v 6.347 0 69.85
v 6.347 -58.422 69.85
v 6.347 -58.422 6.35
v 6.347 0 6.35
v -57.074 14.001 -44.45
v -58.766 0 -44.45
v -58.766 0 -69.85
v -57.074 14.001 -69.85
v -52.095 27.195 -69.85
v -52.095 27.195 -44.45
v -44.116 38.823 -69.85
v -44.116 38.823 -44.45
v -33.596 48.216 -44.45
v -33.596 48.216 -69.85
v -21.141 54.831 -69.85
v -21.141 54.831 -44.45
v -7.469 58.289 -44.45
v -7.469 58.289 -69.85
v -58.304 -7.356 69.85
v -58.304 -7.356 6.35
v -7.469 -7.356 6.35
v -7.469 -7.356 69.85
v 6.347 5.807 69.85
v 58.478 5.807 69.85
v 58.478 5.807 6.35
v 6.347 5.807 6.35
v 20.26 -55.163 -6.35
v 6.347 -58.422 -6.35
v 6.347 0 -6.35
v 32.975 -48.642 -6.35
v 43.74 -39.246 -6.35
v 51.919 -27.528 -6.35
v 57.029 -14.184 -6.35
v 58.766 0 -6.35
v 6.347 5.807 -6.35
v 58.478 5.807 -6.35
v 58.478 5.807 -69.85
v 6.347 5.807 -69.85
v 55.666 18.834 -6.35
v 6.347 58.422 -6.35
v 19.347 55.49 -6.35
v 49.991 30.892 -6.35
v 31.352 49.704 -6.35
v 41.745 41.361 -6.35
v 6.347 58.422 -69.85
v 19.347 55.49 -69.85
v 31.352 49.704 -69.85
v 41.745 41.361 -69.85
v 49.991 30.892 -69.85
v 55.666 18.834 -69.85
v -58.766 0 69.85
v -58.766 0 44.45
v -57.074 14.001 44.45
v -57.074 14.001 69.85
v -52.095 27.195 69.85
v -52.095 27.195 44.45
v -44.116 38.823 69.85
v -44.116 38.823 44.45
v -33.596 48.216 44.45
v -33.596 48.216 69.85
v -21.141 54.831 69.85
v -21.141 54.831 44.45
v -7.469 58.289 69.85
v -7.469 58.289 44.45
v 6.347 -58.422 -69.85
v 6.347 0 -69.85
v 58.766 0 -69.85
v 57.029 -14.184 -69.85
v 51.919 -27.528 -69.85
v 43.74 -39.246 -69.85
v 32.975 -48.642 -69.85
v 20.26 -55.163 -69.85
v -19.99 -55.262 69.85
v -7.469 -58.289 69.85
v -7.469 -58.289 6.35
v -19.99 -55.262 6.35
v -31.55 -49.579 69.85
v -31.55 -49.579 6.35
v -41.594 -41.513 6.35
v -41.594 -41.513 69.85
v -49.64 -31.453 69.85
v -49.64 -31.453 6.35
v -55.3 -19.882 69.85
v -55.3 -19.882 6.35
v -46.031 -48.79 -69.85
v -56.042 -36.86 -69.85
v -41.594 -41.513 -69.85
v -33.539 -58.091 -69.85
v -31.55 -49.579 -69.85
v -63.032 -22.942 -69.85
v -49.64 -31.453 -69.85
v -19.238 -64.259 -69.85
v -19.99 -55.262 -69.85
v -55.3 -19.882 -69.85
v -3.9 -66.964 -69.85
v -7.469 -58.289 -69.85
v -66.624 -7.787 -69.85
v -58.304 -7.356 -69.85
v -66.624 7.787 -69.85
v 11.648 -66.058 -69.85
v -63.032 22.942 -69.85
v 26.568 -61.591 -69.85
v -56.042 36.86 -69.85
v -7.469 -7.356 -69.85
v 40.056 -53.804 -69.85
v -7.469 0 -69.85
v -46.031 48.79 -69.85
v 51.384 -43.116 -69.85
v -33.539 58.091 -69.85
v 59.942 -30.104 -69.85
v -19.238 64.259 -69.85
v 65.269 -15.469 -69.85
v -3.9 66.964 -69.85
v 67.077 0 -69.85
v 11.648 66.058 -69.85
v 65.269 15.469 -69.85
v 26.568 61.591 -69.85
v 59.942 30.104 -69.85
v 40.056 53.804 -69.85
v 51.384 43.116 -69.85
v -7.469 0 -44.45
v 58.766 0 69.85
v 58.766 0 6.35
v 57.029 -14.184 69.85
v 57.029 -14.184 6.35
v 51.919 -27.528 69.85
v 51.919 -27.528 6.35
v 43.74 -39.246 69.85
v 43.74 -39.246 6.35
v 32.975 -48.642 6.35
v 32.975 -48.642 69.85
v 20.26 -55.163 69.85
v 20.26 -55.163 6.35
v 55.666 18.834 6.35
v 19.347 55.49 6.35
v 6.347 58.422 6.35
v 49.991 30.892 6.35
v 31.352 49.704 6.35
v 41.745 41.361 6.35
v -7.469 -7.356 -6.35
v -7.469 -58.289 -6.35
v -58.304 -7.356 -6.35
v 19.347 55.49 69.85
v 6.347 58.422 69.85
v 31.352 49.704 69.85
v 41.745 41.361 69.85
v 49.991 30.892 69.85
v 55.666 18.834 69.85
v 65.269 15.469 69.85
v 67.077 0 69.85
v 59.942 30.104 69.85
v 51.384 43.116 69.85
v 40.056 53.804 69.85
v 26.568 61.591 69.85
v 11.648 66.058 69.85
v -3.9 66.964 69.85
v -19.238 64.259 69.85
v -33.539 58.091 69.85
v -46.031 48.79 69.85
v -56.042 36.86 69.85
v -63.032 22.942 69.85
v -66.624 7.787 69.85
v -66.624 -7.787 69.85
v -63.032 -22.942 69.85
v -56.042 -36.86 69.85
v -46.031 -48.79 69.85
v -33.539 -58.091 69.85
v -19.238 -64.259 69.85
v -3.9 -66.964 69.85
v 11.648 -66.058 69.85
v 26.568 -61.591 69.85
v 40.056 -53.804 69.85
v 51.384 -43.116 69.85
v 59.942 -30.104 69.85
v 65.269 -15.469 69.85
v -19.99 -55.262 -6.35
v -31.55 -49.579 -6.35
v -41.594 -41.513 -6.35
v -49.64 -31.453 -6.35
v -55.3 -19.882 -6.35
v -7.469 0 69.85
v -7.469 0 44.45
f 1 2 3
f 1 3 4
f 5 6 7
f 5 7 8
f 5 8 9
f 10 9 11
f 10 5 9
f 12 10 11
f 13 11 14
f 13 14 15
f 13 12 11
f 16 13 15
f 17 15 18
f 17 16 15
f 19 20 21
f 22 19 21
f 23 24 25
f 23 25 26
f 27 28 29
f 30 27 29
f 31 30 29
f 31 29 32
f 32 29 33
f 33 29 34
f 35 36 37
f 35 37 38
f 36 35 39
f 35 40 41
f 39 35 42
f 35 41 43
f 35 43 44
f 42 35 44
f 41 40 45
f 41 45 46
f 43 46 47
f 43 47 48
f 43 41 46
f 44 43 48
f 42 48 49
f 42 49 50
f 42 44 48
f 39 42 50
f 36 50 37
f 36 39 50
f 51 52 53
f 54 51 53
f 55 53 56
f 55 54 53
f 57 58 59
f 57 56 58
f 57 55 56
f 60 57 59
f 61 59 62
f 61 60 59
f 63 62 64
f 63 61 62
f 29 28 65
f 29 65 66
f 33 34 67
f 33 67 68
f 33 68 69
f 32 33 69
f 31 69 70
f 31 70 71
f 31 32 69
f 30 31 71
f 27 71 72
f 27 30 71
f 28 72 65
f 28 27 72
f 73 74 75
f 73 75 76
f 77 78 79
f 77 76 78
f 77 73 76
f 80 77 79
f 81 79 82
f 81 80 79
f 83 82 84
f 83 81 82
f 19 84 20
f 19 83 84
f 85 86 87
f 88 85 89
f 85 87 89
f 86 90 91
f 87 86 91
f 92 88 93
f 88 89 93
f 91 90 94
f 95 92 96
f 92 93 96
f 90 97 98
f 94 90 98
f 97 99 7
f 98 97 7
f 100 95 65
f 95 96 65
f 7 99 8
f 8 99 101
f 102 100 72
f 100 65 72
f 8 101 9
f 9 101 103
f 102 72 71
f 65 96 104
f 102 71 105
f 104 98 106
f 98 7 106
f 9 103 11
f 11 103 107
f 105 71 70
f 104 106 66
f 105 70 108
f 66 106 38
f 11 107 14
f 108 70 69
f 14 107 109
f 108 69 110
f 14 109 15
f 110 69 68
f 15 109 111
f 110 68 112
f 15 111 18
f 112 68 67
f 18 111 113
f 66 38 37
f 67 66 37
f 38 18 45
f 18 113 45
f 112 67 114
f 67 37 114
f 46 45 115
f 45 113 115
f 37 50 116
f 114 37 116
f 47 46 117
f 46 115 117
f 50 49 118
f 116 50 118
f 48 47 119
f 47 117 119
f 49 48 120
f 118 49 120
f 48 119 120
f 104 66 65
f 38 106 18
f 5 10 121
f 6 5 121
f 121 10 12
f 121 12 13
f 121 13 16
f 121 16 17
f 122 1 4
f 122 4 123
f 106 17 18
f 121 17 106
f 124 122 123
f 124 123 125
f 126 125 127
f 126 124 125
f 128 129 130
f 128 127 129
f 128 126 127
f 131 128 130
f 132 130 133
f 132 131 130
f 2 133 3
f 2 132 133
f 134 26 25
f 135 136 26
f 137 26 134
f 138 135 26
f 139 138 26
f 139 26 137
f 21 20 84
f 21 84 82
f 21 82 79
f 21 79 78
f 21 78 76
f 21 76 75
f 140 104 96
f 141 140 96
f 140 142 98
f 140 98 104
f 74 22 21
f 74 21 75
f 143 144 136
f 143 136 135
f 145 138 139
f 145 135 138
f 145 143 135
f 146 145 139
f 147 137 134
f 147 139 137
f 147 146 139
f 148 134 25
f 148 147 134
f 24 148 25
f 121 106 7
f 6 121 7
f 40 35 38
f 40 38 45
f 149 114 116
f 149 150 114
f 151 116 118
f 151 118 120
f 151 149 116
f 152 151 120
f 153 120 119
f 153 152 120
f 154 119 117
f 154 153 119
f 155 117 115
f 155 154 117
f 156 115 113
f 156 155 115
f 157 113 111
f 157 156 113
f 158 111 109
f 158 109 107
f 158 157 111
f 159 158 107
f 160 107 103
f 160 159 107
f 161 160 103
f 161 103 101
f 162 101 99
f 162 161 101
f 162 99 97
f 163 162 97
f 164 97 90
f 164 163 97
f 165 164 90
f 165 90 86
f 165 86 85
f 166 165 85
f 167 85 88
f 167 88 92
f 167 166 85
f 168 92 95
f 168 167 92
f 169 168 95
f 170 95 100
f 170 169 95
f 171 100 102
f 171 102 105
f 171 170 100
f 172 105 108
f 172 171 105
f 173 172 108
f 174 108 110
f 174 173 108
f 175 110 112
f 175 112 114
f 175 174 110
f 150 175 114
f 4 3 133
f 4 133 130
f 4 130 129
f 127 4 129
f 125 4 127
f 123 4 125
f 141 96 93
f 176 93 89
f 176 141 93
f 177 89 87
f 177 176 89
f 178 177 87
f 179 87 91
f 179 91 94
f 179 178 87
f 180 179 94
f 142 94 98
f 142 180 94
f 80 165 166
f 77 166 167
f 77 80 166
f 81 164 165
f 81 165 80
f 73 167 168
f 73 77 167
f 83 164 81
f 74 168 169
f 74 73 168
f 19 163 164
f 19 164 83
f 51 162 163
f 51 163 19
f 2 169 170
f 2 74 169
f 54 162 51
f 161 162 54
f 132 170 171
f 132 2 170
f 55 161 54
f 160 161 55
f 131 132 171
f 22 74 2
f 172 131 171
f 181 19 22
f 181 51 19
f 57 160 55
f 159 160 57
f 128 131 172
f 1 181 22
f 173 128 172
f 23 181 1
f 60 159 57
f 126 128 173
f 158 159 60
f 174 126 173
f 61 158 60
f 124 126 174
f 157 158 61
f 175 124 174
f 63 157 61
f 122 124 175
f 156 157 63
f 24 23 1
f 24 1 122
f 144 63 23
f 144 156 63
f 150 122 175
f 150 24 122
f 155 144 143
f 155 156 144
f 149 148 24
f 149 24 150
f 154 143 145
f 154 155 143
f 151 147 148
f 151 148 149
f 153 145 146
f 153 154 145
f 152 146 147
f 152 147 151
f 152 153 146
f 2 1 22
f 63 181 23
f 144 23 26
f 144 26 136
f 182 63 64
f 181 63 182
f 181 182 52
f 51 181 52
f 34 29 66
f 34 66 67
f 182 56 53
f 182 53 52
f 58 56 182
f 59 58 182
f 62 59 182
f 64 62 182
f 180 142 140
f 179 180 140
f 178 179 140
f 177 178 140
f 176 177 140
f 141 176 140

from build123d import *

# Parameters (mm, degrees)
F0_R     = 67.0773206954
F1_DEPTH = 69.85
F2_DEPTH = 6.35
F3_DEPTH = 44.45


# Not quite as in the source:
# - a feature names something its author has since deleted; it is built from what else it names


with BuildPart() as f1:
    # F0 (on Top) → F1 (new body, symmetric)
    with BuildSketch(Plane.XY):
        Circle(F0_R)
        with BuildLine():
            ThreePointArc((58.4782874441, 5.8071771637), (58.6939681668, 2.9071480599), (58.7659204727, 0))
            ThreePointArc((58.7659204727, 0), (43.7402884604, -39.2456440183), (6.3470844528, -58.4221527159))
            ThreePointArc((6.3470844528, -58.4221527159), (-0.5649559649, -58.7632047608), (-7.469161507, -58.2893217956))
            ThreePointArc((-7.469161507, -58.2893217956), (-41.5941780551, -41.5133443718), (-58.3037411026, -7.3557584547))
            ThreePointArc((-58.3037411026, -7.3557584547), (-58.6502618149, -3.6851320266), (-58.7659204727, 0))
            ThreePointArc((-58.7659204727, 0), (-44.1155616542, 38.8233258357), (-7.469161507, 58.2893217956))
            ThreePointArc((-7.469161507, 58.2893217956), (-0.5649559649, 58.7632047608), (6.3470844528, 58.4221527159))
            ThreePointArc((6.3470844528, 58.4221527159), (41.745252706, 41.3614226729), (58.4782874441, 5.8071771637))
        make_face(mode=Mode.SUBTRACT)
        with BuildLine():
            ThreePointArc((-7.469161507, -58.2893217956), (-0.5649559649, -58.7632047608), (6.3470844528, -58.4221527159))
            Line((6.3470844528, -58.4221527159), (6.3470844528, 0))
            Line((6.3470844528, 0), (6.3470844528, 5.8071771637))
            Line((6.3470844528, 5.8071771637), (6.3470844528, 58.4221527159))
            ThreePointArc((6.3470844528, 58.4221527159), (-0.5649559649, 58.7632047608), (-7.469161507, 58.2893217956))
            Line((-7.469161507, 58.2893217956), (-7.469161507, 0))
            Line((-7.469161507, 0), (-7.469161507, -7.3557584547))
            Line((-7.469161507, -7.3557584547), (-7.469161507, -58.2893217956))
        make_face()
        with BuildLine():
            Line((6.3470844528, 0), (58.7659204727, 0))
            ThreePointArc((58.7659204727, 0), (58.6939681668, 2.9071480599), (58.4782874441, 5.8071771637))
            Line((58.4782874441, 5.8071771637), (6.3470844528, 5.8071771637))
            Line((6.3470844528, 5.8071771637), (6.3470844528, 0))
        make_face()
        with BuildLine():
            ThreePointArc((-58.7659204727, 0), (-58.6502618149, -3.6851320266), (-58.3037411026, -7.3557584547))
            Line((-58.3037411026, -7.3557584547), (-7.469161507, -7.3557584547))
            Line((-7.469161507, -7.3557584547), (-7.469161507, 0))
            Line((-7.469161507, 0), (-58.7659204727, 0))
        make_face()
    extrude(amount=F1_DEPTH, both=True)

    # F0 (on Top) → F2 (join, symmetric)
    with BuildSketch(Plane.XY):
        with BuildLine():
            ThreePointArc((-58.7659204727, 0), (-58.6502618149, -3.6851320266), (-58.3037411026, -7.3557584547))
            Line((-58.3037411026, -7.3557584547), (-7.469161507, -7.3557584547))
            Line((-7.469161507, -7.3557584547), (-7.469161507, 0))
            Line((-7.469161507, 0), (-58.7659204727, 0))
        make_face()
        with BuildLine():
            Line((6.3470844528, 5.8071771637), (58.4782874441, 5.8071771637))
            ThreePointArc((58.4782874441, 5.8071771637), (41.745252706, 41.3614226729), (6.3470844528, 58.4221527159))
            Line((6.3470844528, 58.4221527159), (6.3470844528, 5.8071771637))
        make_face()
        with BuildLine():
            ThreePointArc((6.3470844528, -58.4221527159), (43.7402884604, -39.2456440183), (58.7659204727, 0))
            Line((58.7659204727, 0), (6.3470844528, 0))
            Line((6.3470844528, 0), (6.3470844528, -58.4221527159))
        make_face()
        with BuildLine():
            ThreePointArc((-58.3037411026, -7.3557584547), (-41.5941780551, -41.5133443718), (-7.469161507, -58.2893217956))
            Line((-7.469161507, -58.2893217956), (-7.469161507, -7.3557584547))
            Line((-7.469161507, -7.3557584547), (-58.3037411026, -7.3557584547))
        make_face()
    extrude(amount=F2_DEPTH, both=True)

    # F0 (on Top) → F3 (join, symmetric)
    with BuildSketch(Plane.XY):
        with BuildLine():
            Line((-7.469161507, 0), (-7.469161507, 58.2893217956))
            ThreePointArc((-7.469161507, 58.2893217956), (-44.1155616542, 38.8233258357), (-58.7659204727, 0))
            Line((-58.7659204727, 0), (-7.469161507, 0))
        make_face()
    extrude(amount=F3_DEPTH, both=True)


solid = f1.part
